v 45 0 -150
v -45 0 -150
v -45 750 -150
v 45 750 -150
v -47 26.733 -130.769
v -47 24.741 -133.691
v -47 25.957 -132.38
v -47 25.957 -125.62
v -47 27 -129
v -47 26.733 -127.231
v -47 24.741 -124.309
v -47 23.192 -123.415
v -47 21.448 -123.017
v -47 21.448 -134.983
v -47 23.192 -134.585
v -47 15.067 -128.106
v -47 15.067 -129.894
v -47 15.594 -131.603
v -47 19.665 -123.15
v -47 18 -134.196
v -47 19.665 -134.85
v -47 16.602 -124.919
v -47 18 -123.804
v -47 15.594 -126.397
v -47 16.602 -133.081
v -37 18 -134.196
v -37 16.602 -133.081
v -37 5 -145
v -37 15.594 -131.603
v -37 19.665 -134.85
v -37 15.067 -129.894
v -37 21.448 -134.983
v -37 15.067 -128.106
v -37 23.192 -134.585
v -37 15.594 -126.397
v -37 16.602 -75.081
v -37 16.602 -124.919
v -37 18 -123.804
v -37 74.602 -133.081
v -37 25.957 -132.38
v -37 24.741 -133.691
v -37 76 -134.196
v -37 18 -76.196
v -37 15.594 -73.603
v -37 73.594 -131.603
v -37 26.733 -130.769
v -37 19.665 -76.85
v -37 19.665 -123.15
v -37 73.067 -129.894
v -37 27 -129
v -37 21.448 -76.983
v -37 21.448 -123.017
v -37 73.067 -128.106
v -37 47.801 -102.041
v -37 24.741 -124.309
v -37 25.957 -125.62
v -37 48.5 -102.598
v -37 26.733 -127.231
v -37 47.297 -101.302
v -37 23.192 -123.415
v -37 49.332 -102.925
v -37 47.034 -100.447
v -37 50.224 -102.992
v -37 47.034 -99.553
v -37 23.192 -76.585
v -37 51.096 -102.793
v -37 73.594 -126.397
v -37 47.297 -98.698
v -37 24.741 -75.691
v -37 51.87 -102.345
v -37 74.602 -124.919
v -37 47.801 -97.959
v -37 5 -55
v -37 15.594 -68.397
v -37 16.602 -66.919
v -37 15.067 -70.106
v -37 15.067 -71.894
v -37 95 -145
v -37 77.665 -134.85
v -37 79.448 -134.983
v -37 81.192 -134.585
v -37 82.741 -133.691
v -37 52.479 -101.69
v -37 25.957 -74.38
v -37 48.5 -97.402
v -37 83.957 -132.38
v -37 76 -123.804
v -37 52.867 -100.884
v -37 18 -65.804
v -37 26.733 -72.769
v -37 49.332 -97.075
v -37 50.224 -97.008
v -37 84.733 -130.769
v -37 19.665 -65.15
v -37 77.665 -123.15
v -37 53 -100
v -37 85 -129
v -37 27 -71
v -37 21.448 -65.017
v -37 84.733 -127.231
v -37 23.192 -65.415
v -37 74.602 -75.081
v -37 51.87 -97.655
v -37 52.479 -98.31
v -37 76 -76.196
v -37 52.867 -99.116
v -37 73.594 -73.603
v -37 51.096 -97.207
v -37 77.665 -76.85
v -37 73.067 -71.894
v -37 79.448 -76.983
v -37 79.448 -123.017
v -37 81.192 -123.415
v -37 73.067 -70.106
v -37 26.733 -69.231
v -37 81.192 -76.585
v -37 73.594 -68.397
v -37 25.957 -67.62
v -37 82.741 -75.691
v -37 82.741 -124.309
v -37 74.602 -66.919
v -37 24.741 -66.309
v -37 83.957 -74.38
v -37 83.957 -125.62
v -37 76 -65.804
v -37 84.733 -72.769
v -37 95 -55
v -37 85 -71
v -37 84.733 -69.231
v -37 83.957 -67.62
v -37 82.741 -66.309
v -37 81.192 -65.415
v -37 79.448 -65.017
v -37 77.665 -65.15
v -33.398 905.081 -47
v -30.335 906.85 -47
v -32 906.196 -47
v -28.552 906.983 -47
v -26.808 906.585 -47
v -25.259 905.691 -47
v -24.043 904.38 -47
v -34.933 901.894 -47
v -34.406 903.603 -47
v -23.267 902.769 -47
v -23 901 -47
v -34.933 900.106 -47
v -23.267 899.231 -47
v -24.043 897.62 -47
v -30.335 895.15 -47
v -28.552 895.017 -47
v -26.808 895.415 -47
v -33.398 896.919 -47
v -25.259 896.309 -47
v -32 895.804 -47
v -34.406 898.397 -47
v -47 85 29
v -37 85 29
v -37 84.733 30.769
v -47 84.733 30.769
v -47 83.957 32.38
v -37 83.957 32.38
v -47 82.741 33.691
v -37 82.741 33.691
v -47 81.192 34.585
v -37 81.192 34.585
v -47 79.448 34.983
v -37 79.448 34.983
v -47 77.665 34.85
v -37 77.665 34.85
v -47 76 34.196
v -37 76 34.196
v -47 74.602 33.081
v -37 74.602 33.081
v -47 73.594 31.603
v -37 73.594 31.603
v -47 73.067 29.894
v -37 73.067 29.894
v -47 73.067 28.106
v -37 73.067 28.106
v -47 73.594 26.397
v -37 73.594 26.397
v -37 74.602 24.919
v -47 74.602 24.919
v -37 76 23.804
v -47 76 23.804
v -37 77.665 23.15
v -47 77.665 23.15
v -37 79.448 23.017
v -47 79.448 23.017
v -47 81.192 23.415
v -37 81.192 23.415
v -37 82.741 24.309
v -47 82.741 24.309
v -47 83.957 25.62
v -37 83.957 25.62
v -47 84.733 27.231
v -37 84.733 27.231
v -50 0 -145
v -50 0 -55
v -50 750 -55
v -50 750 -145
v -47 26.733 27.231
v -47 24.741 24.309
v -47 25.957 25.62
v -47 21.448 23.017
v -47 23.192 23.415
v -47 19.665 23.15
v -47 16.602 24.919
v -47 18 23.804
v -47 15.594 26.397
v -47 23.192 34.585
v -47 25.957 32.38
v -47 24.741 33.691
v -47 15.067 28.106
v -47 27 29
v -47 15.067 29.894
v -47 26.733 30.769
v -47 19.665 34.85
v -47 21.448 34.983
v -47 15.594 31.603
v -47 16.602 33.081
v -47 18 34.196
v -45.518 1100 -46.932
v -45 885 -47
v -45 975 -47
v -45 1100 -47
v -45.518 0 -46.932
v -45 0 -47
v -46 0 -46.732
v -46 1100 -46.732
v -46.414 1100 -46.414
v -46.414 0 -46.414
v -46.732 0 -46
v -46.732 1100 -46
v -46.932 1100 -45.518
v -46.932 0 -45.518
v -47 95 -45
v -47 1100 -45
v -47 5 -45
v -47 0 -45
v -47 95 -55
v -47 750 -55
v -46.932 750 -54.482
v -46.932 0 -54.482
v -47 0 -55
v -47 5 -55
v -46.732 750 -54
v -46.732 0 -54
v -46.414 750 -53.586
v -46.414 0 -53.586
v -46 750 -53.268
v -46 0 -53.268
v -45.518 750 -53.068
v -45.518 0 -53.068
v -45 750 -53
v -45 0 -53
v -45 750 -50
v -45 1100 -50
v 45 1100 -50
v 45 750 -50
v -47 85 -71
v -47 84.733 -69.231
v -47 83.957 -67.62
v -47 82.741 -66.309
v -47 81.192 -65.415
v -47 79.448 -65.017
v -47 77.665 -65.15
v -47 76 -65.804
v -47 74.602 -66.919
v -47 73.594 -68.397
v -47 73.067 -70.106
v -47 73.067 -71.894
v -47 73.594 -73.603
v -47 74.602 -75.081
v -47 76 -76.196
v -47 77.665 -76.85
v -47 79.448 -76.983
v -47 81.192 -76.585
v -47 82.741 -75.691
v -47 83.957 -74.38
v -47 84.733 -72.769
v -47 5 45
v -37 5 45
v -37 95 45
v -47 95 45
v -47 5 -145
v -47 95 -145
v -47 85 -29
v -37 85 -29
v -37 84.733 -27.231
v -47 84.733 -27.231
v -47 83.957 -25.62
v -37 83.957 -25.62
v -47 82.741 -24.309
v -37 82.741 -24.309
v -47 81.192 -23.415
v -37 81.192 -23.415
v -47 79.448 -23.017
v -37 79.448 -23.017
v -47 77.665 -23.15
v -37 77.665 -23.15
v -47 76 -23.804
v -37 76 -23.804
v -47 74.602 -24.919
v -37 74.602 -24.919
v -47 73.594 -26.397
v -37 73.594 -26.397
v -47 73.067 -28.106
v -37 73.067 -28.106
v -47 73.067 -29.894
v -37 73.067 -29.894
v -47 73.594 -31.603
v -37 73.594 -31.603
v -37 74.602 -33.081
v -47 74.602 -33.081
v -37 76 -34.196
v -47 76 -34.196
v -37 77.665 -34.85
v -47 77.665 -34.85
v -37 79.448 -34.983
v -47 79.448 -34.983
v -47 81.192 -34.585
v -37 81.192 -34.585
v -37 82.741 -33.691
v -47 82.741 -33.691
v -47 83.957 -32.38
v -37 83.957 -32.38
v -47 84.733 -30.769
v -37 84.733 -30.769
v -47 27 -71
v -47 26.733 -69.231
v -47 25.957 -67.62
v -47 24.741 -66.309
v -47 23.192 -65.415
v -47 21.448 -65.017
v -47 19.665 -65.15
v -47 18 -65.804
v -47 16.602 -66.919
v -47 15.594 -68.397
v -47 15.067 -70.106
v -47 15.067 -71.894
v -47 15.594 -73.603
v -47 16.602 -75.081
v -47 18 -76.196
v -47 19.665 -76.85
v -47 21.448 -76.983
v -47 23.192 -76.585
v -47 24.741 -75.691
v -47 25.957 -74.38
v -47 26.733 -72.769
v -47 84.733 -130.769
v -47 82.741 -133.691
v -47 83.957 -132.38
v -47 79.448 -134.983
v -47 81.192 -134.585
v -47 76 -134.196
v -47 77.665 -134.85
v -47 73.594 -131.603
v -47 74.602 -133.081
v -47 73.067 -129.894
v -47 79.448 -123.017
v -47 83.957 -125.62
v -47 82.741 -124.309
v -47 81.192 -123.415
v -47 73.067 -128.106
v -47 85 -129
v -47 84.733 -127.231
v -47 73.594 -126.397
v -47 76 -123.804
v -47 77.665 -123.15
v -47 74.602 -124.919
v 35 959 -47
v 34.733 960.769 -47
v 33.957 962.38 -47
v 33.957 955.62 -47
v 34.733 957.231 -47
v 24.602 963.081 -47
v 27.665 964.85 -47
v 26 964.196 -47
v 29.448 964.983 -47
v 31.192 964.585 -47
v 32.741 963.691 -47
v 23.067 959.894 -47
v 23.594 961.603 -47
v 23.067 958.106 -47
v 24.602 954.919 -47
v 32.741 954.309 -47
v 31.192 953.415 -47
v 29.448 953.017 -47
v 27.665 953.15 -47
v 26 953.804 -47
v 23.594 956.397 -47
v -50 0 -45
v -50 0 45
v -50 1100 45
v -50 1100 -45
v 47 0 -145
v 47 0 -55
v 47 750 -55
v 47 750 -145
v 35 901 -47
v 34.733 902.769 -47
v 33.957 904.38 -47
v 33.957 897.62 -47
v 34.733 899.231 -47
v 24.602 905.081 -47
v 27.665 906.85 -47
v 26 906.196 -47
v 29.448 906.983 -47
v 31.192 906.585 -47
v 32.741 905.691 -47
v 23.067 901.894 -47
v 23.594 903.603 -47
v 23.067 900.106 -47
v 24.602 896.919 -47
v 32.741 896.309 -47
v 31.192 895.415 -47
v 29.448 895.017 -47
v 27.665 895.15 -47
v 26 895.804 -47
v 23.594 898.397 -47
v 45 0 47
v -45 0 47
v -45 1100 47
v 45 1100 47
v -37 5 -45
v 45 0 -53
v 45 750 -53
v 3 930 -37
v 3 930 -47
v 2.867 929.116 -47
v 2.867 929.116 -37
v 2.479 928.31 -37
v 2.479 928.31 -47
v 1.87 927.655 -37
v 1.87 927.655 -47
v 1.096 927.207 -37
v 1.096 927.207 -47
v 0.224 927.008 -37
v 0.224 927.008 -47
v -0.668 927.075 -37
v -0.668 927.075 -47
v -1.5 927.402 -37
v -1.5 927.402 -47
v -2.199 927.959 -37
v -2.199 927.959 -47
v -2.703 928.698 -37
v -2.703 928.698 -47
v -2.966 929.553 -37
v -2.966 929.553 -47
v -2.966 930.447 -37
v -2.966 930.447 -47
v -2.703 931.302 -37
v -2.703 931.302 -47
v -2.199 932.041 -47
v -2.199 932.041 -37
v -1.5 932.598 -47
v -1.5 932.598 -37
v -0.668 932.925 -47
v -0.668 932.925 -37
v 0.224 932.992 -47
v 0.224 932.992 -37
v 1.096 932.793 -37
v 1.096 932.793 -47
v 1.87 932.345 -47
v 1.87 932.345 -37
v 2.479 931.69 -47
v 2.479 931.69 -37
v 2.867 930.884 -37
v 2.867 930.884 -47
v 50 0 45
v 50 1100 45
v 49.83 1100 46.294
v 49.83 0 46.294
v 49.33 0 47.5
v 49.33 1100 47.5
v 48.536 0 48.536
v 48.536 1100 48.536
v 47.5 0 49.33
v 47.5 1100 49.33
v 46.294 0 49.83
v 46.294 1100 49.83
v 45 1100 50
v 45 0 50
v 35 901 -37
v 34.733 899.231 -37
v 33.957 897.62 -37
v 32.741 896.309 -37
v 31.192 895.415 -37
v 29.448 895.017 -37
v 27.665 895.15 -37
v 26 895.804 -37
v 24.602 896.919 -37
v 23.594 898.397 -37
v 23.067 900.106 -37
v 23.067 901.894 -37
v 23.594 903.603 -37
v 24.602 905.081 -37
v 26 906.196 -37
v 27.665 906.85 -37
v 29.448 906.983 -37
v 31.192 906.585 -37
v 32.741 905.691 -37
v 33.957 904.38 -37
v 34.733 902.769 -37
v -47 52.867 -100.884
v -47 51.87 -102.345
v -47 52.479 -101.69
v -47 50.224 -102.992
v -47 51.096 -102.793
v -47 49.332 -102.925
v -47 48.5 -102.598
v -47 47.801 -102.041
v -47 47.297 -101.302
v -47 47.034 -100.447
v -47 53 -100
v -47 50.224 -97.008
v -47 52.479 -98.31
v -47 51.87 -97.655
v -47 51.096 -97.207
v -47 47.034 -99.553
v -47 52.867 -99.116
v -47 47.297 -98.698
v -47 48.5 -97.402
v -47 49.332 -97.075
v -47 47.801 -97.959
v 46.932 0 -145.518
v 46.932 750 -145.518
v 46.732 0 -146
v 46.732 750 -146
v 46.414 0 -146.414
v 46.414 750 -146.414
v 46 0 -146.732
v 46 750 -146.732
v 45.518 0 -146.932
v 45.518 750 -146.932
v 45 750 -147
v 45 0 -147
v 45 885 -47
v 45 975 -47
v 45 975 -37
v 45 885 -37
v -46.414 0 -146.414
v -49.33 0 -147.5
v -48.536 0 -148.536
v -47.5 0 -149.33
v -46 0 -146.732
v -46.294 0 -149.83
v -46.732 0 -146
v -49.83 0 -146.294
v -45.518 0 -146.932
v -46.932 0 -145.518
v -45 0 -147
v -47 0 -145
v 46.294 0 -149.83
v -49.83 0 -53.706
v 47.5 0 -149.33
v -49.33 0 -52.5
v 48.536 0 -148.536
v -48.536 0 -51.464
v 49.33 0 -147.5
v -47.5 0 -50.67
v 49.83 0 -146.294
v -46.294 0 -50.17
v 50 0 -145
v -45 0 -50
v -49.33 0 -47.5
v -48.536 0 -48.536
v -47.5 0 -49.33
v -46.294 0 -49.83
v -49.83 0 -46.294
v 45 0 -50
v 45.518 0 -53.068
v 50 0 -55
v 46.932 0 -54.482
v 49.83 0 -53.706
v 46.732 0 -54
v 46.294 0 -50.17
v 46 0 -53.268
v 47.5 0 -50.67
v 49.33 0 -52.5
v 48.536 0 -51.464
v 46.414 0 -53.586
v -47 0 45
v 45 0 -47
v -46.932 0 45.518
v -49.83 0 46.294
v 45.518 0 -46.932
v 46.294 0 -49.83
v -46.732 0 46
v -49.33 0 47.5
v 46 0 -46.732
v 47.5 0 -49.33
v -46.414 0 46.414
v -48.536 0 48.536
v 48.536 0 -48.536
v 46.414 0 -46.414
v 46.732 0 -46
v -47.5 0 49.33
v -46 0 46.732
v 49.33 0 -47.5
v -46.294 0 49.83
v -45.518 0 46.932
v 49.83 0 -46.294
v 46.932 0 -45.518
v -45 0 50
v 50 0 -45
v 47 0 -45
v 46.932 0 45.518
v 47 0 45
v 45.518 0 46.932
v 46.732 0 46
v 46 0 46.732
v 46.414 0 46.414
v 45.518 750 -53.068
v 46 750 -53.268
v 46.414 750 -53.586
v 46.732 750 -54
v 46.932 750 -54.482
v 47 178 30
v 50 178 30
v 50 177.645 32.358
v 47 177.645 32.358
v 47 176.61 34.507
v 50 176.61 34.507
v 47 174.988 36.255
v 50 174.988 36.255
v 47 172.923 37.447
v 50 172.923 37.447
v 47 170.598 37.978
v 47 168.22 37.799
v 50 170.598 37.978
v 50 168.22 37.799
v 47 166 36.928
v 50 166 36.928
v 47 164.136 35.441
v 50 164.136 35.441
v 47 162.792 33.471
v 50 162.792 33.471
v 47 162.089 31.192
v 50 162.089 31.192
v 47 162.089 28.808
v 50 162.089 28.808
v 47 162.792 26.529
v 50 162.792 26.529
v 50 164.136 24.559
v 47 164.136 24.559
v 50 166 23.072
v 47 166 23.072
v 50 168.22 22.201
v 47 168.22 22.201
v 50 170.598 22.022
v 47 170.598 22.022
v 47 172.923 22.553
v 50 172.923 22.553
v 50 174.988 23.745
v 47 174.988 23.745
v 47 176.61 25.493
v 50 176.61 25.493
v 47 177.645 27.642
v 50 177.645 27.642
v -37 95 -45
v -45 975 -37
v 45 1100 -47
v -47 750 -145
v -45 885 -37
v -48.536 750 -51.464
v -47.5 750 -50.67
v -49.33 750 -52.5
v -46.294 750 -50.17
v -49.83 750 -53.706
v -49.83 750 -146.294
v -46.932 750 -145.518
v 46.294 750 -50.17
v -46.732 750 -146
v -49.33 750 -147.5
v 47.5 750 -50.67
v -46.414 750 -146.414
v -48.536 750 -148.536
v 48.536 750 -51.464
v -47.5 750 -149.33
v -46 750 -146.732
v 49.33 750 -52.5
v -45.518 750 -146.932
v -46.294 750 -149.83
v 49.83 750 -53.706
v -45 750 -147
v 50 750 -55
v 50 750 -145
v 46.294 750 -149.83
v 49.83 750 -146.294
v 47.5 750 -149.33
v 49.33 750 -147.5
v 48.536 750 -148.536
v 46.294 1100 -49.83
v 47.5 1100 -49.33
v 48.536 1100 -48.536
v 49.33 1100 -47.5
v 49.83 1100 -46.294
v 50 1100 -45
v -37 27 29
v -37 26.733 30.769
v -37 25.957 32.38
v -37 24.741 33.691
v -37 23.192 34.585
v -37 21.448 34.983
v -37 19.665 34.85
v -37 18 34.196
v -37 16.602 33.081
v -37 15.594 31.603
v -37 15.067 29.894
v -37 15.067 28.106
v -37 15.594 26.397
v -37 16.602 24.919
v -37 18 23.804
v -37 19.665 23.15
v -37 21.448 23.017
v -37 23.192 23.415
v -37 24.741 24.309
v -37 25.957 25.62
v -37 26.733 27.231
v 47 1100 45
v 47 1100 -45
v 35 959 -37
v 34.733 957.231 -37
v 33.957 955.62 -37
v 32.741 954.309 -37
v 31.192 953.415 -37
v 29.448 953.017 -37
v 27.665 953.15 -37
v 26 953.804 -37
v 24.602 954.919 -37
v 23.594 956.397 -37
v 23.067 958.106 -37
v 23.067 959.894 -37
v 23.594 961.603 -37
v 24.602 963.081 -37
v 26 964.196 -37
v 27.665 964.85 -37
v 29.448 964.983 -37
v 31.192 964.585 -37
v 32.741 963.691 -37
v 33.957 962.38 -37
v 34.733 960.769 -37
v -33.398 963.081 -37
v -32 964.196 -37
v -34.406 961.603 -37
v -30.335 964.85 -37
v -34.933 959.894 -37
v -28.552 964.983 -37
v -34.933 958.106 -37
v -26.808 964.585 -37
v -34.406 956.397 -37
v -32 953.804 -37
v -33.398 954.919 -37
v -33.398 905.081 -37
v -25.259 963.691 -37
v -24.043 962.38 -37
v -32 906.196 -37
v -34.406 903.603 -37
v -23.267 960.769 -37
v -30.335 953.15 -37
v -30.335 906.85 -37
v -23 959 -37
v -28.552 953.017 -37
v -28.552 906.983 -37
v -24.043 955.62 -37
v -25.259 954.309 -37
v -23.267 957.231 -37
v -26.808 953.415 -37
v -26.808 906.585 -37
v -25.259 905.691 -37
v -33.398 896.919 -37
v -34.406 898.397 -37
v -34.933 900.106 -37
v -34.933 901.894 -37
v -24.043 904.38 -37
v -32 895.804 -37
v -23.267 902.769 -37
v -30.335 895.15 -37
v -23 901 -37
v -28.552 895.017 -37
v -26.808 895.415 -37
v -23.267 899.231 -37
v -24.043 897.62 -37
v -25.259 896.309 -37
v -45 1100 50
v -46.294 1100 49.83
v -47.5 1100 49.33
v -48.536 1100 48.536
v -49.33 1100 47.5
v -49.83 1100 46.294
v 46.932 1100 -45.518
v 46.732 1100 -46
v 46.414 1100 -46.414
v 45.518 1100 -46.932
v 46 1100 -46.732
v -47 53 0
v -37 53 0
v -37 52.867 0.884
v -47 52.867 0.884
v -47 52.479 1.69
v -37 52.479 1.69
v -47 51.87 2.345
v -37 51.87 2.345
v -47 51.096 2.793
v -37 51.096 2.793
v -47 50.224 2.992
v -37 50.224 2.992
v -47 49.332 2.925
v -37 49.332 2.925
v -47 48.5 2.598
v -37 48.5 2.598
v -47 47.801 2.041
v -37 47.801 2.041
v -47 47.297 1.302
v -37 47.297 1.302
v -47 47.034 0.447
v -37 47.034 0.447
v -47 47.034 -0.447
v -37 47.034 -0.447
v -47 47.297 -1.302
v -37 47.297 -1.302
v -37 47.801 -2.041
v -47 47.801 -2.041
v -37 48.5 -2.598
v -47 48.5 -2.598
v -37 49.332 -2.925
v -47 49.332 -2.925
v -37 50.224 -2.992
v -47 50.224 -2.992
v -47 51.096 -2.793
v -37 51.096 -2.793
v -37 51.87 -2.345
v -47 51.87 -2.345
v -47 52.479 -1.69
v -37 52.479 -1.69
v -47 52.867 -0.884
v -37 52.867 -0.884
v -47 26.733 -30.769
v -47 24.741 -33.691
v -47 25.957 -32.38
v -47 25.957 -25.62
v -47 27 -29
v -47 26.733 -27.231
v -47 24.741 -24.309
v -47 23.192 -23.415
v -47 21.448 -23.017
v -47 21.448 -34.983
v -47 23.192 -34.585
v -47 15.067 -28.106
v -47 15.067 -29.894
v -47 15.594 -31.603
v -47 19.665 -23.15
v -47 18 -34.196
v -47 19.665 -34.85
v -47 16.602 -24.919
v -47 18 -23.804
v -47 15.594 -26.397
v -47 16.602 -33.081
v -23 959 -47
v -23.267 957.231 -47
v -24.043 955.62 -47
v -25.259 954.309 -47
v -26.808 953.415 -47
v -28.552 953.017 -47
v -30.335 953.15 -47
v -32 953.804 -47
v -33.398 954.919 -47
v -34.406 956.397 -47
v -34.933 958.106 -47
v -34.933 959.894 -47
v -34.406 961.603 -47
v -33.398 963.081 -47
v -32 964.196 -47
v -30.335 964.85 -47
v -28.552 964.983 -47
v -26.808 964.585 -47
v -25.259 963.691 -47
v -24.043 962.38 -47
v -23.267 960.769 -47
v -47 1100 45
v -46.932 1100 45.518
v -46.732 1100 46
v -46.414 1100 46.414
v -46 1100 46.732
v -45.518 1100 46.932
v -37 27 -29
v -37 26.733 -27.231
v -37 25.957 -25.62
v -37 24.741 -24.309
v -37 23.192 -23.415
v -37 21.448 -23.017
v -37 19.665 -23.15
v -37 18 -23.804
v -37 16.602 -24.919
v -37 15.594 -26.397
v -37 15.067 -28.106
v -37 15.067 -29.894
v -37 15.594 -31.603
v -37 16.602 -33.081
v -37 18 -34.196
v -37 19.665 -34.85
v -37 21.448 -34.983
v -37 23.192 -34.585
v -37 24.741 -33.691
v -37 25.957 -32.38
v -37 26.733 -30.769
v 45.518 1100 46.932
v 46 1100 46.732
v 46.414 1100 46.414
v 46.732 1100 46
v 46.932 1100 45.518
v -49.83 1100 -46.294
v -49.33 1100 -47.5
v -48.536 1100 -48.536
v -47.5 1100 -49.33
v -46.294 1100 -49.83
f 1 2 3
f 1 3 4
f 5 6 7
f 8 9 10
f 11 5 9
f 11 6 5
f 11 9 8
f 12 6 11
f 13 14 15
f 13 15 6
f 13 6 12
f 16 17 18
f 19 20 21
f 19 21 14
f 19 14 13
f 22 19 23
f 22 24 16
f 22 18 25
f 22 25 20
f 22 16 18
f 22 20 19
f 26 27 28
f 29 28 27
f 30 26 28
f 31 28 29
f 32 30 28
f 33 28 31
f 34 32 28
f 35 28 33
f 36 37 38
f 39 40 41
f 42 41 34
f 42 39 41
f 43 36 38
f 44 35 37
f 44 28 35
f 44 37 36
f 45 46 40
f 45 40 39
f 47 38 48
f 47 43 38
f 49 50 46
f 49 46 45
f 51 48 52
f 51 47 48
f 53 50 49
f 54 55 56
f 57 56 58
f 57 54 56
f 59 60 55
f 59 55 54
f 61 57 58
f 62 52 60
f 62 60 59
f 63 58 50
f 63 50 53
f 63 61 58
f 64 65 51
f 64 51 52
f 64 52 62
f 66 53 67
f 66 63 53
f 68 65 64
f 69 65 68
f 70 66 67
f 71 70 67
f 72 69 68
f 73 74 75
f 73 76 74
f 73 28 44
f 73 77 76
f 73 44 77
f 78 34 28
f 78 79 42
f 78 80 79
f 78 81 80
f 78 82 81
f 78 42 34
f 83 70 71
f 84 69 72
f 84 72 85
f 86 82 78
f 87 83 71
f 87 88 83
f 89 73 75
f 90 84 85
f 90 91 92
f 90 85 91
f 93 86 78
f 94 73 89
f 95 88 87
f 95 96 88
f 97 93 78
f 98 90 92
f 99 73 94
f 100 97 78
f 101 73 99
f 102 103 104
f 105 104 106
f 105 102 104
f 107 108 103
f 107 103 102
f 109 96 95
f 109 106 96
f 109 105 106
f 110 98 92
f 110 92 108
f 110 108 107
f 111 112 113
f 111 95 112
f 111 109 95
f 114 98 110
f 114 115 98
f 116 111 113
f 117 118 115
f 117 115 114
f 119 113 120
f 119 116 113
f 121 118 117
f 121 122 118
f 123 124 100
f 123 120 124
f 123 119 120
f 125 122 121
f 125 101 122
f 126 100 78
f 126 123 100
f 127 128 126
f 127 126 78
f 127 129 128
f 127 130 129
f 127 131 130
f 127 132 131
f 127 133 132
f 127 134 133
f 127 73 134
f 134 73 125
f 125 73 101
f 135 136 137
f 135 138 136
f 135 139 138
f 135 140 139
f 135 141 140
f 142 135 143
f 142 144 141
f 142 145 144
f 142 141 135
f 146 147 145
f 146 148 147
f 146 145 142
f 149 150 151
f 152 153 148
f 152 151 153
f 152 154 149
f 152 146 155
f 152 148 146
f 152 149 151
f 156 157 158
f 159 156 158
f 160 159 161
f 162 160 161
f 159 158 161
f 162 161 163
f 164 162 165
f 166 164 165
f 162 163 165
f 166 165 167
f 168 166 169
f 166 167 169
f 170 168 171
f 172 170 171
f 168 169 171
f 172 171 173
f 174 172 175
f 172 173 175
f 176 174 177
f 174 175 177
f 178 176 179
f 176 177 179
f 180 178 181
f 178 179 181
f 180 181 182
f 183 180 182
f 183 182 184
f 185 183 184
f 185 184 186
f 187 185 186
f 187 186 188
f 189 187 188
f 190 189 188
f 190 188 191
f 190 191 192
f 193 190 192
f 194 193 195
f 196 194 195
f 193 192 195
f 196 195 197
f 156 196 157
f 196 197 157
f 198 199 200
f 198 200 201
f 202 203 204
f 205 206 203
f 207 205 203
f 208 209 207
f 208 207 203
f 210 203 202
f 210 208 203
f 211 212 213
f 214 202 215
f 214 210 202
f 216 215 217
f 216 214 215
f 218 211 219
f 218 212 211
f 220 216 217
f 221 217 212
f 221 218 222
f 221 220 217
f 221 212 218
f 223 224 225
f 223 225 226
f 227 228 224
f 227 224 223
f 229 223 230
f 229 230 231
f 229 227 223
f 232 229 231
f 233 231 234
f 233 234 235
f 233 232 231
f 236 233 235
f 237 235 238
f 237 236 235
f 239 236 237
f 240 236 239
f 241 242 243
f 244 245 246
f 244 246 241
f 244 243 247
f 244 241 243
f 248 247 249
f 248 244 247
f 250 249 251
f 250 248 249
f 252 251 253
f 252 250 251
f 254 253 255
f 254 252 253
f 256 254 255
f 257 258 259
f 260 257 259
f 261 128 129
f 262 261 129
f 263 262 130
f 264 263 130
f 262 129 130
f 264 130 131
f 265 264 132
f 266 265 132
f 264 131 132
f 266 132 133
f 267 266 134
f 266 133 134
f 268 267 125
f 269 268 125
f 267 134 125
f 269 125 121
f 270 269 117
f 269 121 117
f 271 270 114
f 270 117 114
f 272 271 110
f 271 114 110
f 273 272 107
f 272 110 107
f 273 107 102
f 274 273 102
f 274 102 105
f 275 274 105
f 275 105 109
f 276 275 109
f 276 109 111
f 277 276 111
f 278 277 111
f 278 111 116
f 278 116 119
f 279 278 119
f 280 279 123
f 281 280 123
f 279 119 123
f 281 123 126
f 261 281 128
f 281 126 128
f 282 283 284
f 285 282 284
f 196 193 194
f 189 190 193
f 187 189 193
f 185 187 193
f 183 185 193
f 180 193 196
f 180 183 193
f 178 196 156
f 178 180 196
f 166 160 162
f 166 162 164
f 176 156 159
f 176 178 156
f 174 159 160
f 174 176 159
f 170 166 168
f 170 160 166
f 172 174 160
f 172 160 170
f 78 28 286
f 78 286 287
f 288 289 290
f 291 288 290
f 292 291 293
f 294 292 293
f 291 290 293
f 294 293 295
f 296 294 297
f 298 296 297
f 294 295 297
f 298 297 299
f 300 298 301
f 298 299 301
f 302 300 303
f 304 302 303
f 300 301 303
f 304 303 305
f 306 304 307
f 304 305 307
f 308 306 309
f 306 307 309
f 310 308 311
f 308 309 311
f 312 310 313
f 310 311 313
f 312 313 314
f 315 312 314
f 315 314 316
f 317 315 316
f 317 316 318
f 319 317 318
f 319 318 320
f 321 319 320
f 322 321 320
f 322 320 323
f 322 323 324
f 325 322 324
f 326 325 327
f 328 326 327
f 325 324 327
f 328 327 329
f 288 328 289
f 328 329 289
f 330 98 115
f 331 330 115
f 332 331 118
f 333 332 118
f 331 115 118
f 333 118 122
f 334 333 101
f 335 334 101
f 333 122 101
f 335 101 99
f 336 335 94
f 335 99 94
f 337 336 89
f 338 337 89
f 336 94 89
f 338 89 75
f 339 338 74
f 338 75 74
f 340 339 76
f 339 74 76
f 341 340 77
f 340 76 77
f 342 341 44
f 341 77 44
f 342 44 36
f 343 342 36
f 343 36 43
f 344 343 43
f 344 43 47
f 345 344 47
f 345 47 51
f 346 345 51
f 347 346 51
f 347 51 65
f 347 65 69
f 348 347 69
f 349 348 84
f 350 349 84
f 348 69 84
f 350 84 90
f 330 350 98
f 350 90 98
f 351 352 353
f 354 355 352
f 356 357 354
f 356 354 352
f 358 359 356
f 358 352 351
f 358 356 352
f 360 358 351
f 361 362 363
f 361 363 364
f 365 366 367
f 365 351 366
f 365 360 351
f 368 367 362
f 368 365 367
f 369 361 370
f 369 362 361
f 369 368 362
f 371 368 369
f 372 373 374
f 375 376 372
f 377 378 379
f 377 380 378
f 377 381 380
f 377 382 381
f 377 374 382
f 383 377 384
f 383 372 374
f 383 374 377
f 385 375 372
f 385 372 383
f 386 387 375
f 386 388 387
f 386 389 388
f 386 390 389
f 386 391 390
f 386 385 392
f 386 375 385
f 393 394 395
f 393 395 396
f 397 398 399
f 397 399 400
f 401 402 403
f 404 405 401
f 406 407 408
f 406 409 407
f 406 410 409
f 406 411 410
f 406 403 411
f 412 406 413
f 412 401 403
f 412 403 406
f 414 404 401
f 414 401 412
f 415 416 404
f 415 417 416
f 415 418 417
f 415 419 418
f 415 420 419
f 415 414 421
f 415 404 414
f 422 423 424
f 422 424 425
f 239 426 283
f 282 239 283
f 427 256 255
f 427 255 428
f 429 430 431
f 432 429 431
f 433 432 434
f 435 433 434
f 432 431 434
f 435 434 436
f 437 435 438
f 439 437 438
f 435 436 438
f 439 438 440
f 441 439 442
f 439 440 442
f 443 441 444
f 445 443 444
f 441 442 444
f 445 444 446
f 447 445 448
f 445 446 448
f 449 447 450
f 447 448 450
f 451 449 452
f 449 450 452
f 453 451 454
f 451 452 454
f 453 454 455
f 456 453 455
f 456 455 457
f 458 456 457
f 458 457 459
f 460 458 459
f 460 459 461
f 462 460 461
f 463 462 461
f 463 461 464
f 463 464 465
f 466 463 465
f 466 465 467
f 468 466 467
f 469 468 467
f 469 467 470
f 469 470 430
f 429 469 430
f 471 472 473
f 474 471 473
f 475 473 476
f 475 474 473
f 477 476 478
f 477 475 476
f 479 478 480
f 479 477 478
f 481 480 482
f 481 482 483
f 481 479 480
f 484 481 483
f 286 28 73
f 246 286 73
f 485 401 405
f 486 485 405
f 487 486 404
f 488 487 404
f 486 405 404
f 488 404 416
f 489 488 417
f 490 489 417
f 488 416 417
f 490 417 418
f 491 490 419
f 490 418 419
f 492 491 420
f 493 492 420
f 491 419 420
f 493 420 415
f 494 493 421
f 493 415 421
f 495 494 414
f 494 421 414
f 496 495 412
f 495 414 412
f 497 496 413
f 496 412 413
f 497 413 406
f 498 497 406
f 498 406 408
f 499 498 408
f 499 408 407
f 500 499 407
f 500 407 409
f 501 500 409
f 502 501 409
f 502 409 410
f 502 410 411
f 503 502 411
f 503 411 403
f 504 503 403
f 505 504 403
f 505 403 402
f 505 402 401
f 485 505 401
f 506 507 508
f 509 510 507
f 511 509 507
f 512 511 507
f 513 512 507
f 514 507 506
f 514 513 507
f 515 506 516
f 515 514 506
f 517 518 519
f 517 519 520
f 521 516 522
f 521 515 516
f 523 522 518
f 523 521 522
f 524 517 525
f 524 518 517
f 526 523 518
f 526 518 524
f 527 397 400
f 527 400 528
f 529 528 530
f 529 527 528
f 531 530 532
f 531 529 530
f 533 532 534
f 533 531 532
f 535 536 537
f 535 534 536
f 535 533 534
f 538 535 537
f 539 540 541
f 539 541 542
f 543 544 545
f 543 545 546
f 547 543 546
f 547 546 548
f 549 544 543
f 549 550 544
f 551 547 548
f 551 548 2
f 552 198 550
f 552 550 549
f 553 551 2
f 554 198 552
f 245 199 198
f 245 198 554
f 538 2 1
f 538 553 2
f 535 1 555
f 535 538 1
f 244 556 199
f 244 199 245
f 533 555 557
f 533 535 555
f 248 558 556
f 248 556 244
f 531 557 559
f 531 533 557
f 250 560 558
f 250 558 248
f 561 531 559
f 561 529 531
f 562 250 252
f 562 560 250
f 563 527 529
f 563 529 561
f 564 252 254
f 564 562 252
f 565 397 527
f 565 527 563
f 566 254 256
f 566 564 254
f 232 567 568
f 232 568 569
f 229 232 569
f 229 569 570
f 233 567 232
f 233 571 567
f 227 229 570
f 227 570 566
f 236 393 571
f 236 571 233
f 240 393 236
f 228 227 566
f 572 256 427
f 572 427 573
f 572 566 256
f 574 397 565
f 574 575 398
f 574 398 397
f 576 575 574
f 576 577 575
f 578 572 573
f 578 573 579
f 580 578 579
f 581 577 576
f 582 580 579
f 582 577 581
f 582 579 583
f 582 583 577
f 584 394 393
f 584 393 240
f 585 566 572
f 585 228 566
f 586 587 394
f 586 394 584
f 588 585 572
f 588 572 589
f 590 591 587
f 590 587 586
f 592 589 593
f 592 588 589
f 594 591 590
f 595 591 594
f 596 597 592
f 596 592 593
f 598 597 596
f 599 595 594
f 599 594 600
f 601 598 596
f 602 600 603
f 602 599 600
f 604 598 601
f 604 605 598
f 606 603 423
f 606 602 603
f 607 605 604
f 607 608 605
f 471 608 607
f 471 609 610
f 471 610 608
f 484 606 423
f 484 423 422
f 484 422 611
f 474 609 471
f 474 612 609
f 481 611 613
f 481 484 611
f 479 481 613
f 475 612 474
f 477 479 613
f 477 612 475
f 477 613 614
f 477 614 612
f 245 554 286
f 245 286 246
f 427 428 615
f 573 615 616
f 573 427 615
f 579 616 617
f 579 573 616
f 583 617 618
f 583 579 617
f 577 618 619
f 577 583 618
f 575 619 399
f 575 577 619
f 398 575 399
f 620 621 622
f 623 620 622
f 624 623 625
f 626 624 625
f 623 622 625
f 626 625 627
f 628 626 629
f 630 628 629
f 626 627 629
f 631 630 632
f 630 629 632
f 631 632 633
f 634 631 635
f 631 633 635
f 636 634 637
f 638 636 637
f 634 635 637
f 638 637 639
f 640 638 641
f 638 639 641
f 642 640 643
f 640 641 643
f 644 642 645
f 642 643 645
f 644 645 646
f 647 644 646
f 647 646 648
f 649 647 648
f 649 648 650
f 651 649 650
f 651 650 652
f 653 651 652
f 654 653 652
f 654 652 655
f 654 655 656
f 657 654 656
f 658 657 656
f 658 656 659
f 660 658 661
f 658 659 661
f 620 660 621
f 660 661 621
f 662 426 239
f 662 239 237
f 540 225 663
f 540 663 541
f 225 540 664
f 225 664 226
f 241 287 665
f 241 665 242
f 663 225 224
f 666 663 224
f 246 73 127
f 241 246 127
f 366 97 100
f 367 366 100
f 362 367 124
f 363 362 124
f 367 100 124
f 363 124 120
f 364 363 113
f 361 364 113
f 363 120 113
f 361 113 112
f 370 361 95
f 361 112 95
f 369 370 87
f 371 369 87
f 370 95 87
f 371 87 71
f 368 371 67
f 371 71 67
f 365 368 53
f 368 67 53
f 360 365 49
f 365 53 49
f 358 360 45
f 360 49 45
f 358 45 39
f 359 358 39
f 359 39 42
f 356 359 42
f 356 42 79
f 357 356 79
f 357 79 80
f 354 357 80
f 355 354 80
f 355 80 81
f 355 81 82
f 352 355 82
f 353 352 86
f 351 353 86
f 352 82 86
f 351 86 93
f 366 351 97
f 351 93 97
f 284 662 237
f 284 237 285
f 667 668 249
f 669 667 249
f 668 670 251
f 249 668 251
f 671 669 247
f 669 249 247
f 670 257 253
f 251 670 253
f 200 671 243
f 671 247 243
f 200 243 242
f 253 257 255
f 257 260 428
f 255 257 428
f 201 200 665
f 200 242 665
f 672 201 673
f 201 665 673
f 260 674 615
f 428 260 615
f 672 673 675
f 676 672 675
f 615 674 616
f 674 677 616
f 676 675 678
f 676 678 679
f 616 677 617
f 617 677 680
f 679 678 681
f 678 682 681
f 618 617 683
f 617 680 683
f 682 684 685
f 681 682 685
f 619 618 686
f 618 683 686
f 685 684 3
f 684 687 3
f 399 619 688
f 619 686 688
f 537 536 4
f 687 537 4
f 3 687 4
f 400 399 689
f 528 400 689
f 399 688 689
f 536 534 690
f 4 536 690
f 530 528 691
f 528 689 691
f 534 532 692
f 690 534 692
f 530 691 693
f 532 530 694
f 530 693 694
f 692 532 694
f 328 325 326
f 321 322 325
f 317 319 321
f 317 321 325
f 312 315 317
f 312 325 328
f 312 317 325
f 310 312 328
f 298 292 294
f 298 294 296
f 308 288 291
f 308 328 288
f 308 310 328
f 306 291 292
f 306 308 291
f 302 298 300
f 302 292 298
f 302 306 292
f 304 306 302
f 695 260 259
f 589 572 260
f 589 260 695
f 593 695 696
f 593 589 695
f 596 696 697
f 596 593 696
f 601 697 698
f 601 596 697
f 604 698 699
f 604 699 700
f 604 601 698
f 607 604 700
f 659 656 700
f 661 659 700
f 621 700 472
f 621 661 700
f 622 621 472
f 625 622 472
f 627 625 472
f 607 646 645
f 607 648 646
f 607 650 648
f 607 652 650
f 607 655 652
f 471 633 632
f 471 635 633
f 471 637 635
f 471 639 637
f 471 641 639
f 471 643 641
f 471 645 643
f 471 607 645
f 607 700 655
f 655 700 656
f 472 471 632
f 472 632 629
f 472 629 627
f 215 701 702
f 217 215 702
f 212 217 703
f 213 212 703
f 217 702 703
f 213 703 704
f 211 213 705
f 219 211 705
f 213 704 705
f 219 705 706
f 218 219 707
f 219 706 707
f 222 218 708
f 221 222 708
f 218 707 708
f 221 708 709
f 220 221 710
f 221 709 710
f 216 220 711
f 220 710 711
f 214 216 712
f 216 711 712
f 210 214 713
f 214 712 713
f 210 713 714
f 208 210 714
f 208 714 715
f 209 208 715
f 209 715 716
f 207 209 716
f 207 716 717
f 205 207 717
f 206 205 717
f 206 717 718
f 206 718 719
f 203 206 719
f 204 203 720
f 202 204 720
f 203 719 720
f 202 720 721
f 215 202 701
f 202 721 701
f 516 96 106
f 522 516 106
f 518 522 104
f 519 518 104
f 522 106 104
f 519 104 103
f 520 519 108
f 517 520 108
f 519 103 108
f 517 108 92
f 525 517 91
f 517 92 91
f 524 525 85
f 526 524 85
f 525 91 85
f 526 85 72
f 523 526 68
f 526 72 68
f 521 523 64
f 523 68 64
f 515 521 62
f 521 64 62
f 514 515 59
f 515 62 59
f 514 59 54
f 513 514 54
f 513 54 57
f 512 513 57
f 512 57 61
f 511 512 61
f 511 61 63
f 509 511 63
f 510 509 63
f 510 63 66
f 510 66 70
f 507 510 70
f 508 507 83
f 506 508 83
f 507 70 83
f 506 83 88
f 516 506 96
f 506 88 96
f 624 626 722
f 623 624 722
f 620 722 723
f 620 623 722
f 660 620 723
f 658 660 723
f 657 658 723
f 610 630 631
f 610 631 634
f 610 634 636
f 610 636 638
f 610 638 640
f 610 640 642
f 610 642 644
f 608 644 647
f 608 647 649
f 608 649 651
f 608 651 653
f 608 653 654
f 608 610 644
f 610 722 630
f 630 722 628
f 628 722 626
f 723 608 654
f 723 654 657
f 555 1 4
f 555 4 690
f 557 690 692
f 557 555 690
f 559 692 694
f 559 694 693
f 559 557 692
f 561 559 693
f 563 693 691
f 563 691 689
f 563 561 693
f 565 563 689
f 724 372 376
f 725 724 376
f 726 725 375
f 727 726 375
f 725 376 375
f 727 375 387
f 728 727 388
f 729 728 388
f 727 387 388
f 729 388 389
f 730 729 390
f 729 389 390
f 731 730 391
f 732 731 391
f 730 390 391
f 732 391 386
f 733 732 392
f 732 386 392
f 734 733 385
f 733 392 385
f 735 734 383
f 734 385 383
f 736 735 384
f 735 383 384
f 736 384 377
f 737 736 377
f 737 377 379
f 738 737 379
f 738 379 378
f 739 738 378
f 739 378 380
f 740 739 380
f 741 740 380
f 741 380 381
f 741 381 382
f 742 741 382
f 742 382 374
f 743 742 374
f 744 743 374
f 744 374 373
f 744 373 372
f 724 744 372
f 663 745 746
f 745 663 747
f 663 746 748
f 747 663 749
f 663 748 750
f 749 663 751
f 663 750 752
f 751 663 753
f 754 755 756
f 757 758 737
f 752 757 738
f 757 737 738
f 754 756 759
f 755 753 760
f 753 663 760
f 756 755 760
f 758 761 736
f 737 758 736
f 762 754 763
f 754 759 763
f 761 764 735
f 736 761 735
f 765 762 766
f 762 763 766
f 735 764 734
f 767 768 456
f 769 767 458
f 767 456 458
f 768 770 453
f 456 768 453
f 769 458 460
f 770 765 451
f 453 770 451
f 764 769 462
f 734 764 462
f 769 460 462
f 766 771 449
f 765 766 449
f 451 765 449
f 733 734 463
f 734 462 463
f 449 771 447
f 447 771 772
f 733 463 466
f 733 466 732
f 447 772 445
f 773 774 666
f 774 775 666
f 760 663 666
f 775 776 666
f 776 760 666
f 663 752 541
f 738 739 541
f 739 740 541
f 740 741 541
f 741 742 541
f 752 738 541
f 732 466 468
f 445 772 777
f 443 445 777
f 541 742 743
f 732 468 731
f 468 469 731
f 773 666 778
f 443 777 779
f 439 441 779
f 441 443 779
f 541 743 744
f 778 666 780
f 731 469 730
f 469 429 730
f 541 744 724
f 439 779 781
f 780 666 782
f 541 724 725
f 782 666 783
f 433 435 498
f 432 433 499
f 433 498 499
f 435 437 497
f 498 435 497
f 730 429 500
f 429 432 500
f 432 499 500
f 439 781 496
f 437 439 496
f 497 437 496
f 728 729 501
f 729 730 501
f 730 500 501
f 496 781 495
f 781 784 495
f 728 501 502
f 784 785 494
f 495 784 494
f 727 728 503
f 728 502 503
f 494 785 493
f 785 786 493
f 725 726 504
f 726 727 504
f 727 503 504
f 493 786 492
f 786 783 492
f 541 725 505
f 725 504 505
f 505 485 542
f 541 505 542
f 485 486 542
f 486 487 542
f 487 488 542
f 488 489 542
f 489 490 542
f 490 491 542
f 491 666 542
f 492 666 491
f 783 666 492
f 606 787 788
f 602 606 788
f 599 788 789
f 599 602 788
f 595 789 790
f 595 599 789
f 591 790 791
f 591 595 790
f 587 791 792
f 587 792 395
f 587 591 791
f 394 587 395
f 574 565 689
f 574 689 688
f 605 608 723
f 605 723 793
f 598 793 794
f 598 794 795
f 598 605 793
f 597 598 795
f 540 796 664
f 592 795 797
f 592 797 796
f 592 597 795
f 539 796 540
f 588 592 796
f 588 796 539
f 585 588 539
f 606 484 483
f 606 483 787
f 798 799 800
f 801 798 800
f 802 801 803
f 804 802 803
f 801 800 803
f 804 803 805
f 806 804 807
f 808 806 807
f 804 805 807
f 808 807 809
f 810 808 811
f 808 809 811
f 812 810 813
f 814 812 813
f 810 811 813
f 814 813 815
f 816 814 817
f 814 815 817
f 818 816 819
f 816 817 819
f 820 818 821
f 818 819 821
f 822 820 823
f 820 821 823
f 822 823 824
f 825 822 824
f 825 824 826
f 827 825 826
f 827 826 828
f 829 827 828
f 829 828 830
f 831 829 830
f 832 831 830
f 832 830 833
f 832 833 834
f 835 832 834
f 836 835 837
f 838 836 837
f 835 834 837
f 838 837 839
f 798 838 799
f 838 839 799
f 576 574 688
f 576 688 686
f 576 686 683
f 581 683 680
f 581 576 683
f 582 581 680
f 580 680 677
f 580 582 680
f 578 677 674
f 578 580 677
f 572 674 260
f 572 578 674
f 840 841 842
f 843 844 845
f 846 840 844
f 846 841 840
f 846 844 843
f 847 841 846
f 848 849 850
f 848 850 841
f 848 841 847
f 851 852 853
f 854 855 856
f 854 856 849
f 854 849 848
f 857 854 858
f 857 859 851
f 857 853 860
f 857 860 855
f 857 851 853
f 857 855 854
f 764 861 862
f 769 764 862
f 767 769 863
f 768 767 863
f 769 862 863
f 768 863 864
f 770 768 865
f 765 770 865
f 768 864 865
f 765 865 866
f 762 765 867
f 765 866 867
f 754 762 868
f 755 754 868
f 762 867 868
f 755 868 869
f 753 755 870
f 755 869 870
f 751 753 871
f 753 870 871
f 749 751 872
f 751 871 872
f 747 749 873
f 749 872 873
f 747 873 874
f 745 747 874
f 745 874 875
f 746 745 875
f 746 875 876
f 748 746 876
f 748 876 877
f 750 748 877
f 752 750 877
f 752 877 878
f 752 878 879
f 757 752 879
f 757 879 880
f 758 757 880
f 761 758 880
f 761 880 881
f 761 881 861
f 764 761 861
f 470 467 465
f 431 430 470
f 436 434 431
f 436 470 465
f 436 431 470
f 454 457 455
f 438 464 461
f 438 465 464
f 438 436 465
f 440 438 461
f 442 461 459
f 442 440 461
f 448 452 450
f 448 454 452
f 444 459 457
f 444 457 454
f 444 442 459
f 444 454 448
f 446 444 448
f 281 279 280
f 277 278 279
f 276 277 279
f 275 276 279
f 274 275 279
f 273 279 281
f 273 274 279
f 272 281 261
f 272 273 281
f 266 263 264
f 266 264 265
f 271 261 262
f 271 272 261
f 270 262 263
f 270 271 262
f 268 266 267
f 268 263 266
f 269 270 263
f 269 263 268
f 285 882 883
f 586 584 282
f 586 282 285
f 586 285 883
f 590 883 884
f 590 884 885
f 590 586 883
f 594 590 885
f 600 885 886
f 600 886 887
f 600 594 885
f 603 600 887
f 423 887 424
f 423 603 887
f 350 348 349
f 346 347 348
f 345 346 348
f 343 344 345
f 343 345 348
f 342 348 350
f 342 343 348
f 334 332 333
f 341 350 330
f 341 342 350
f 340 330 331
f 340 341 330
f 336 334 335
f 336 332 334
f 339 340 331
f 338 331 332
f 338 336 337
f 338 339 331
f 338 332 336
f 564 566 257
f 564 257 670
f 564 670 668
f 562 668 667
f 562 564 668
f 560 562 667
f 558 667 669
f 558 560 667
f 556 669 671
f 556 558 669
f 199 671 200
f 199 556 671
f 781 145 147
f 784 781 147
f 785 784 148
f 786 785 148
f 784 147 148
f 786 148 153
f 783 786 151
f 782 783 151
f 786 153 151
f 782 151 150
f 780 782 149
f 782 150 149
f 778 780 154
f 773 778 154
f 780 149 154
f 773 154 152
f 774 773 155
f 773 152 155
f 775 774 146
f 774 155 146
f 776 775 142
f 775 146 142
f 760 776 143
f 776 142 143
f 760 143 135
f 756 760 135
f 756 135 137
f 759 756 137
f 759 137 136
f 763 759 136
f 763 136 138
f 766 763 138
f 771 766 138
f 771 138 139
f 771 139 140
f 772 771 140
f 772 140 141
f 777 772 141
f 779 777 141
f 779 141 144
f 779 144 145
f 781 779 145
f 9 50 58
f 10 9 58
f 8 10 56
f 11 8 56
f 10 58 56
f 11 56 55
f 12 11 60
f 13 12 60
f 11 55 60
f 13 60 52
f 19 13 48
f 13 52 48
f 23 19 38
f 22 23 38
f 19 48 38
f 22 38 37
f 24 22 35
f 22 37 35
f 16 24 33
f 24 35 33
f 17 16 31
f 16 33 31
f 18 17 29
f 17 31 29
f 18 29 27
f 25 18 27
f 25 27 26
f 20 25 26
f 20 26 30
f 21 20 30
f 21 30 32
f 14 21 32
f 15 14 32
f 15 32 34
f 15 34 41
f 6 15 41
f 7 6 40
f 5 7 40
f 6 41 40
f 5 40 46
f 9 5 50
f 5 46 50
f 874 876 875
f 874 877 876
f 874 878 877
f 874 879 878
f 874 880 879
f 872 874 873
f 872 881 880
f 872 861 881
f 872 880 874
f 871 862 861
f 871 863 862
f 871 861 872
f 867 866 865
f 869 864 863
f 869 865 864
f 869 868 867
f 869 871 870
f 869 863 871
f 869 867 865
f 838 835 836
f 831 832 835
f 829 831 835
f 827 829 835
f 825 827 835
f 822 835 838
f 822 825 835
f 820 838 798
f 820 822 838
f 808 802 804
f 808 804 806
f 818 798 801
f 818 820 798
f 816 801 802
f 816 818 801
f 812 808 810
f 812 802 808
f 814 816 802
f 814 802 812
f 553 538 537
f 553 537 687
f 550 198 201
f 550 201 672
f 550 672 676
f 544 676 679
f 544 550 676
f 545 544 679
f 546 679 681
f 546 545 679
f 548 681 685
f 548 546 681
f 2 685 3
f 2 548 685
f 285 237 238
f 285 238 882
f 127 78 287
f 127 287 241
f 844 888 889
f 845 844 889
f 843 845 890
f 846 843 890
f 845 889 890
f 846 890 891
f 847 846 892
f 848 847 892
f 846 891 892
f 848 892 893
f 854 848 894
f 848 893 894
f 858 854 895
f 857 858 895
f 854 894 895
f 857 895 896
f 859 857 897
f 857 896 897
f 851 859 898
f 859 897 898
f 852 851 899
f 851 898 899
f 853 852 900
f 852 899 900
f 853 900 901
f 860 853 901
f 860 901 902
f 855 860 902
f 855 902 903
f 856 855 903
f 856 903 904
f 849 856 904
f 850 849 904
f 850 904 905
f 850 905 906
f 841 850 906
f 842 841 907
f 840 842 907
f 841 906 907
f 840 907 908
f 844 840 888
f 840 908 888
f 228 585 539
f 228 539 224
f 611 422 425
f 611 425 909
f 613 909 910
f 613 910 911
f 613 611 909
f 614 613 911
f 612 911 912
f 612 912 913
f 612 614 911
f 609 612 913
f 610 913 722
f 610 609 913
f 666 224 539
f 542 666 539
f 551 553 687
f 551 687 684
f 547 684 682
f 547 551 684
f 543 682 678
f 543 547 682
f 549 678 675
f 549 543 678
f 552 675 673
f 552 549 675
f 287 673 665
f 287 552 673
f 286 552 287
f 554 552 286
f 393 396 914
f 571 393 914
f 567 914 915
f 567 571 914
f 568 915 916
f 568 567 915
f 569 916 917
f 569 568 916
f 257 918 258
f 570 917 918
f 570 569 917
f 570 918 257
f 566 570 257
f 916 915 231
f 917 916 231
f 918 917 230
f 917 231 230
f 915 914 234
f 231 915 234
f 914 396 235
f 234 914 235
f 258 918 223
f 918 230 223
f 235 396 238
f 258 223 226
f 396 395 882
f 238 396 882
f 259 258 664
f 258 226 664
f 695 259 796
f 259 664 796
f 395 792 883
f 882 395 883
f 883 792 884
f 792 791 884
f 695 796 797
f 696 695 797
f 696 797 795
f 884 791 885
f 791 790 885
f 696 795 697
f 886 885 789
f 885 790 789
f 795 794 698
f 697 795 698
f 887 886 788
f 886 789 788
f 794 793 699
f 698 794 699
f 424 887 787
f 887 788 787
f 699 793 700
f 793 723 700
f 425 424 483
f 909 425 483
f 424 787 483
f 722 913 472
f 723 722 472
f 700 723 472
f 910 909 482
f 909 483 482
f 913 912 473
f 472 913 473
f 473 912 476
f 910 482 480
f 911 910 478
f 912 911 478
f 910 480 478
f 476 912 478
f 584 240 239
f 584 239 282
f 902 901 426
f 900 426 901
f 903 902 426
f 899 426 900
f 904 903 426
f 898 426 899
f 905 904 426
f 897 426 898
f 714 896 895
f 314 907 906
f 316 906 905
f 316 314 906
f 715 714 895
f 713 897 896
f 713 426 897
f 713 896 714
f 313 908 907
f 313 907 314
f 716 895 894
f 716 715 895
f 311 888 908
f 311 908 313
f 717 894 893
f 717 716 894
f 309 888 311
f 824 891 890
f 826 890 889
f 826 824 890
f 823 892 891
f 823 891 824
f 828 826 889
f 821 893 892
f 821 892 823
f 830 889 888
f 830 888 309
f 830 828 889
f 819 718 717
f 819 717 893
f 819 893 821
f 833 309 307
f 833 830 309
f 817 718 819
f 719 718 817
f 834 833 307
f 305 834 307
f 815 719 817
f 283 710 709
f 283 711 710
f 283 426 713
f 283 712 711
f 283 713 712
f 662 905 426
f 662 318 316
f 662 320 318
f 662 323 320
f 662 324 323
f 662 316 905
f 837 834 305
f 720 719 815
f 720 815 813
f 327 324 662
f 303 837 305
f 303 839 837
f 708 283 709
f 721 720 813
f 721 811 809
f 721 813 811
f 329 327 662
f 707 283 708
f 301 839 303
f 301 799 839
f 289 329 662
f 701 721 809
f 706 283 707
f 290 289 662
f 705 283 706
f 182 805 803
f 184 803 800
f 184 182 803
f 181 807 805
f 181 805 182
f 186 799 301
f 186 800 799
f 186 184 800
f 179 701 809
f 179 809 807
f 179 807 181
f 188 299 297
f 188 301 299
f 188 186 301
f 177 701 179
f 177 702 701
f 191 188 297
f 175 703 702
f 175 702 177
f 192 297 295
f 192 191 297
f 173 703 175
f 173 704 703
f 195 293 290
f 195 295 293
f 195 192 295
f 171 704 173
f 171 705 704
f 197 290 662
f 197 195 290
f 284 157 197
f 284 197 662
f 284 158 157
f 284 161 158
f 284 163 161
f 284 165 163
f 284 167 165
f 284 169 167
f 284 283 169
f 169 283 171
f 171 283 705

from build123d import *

# Parameters (mm, degrees)
F1_DEPTH = 1100
F2_R     = 8
F3_DEPTH = 3
F4_W     = 350
F4_H     = 90
F4_H_2   = 5
F5_DEPTH = 100.001
F7_START = -87
F6_W     = 90
F6_H     = 90
F6_R     = 6
F6_R_2   = 3
F7_DEPTH = 10
F8_W     = 90
F8_H     = 90
F8_R     = 6
F8_R_2   = 3
F9_DEPTH = 13


with BuildPart() as f1:
    # F0 (on Front) → F1 (new body)
    with BuildSketch(Plane.XZ):
        with BuildLine():
            ThreePointArc((50, 45), (48.5355339059, 48.5355339059), (45, 50))
            Line((45, 50), (-45, 50))
            ThreePointArc((-45, 50), (-48.5355339059, 48.5355339059), (-50, 45))
            Line((-50, 45), (-50, -45))
            ThreePointArc((-50, -45), (-48.5355339059, -48.5355339059), (-45, -50))
            Line((-45, -50), (45, -50))
            ThreePointArc((45, -50), (48.5355339059, -48.5355339059), (50, -45))
            Line((50, -45), (50, 45))
        make_face()
        with BuildLine():
            ThreePointArc((-47, 45), (-46.4142135624, 46.4142135624), (-45, 47))
            Line((-45, 47), (45, 47))
            ThreePointArc((45, 47), (46.4142135624, 46.4142135624), (47, 45))
            Line((47, 45), (47, -45))
            ThreePointArc((47, -45), (46.4142135624, -46.4142135624), (45, -47))
            Line((45, -47), (-45, -47))
            ThreePointArc((-45, -47), (-46.4142135624, -46.4142135624), (-47, -45))
            Line((-47, -45), (-47, 45))
        make_face(mode=Mode.SUBTRACT)
        with BuildLine():
            ThreePointArc((50, -55), (48.5355339059, -51.4644660941), (45, -50))
            Line((45, -50), (-45, -50))
            ThreePointArc((-45, -50), (-48.5355339059, -51.4644660941), (-50, -55))
            Line((-50, -55), (-50, -145))
            ThreePointArc((-50, -145), (-48.5355339059, -148.5355339059), (-45, -150))
            Line((-45, -150), (45, -150))
            ThreePointArc((45, -150), (48.5355339059, -148.5355339059), (50, -145))
            Line((50, -145), (50, -55))
        make_face()
        with BuildLine():
            ThreePointArc((-47, -55), (-46.4142135624, -53.5857864376), (-45, -53))
            Line((-45, -53), (45, -53))
            ThreePointArc((45, -53), (46.4142135624, -53.5857864376), (47, -55))
            Line((47, -55), (47, -145))
            ThreePointArc((47, -145), (46.4142135624, -146.4142135624), (45, -147))
            Line((45, -147), (-45, -147))
            ThreePointArc((-45, -147), (-46.4142135624, -146.4142135624), (-47, -145))
            Line((-47, -145), (-47, -55))
        make_face(mode=Mode.SUBTRACT)
    extrude(amount=-F1_DEPTH)

    # F2 (on face) → F3 (cut, through all)
    with BuildSketch(Plane.YZ.offset(50)):
        with Locations((170, 30)):
            Circle(F2_R)
    extrude(amount=-F3_DEPTH, mode=Mode.SUBTRACT)

    # F4 (on face) → F5 (cut, through all)
    with BuildSketch(Plane.YZ.offset(50)):
        with Locations((925, -100)):
            Rectangle(F4_W, F4_H)
        with Locations((925, -147.5)):
            Rectangle(F4_W, F4_H_2)
        with Locations((925, -52.5)):
            Rectangle(F4_W, F4_H_2)
    extrude(amount=-F5_DEPTH, mode=Mode.SUBTRACT)

    # F6 (on face) → F7 (join)
    with BuildSketch(Plane.YZ.offset(50).offset(F7_START)):
        with Locations((50, 0)):
            Rectangle(F6_W, F6_H)
        with Locations((21, -29)):
            Circle(F6_R, mode=Mode.SUBTRACT)
        with Locations((21, 29)):
            Circle(F6_R, mode=Mode.SUBTRACT)
        with Locations((79, -29)):
            Circle(F6_R, mode=Mode.SUBTRACT)
        with Locations((50, 0)):
            Circle(F6_R_2, mode=Mode.SUBTRACT)
        with Locations((79, 29)):
            Circle(F6_R, mode=Mode.SUBTRACT)
        with Locations((50, -100)):
            Rectangle(F6_W, F6_H)
        with Locations((21, -129)):
            Circle(F6_R, mode=Mode.SUBTRACT)
        with Locations((21, -71)):
            Circle(F6_R, mode=Mode.SUBTRACT)
        with Locations((50, -100)):
            Circle(F6_R_2, mode=Mode.SUBTRACT)
        with Locations((79, -129)):
            Circle(F6_R, mode=Mode.SUBTRACT)
        with Locations((79, -71)):
            Circle(F6_R, mode=Mode.SUBTRACT)
    extrude(amount=-F7_DEPTH)

    # F8 (on face) → F9 (join)
    with BuildSketch(Plane(origin=(0, 0, -50), x_dir=(1, 0, 0), z_dir=(0, 0, -1))):
        with Locations((0, -930)):
            Rectangle(F8_W, F8_H)
        with Locations((-29, -959)):
            Circle(F8_R, mode=Mode.SUBTRACT)
        with Locations((0, -930)):
            Circle(F8_R_2, mode=Mode.SUBTRACT)
        with Locations((29, -959)):
            Circle(F8_R, mode=Mode.SUBTRACT)
        with Locations((-29, -901)):
            Circle(F8_R, mode=Mode.SUBTRACT)
        with Locations((29, -901)):
            Circle(F8_R, mode=Mode.SUBTRACT)
    extrude(amount=-F9_DEPTH)


solid = f1.part
